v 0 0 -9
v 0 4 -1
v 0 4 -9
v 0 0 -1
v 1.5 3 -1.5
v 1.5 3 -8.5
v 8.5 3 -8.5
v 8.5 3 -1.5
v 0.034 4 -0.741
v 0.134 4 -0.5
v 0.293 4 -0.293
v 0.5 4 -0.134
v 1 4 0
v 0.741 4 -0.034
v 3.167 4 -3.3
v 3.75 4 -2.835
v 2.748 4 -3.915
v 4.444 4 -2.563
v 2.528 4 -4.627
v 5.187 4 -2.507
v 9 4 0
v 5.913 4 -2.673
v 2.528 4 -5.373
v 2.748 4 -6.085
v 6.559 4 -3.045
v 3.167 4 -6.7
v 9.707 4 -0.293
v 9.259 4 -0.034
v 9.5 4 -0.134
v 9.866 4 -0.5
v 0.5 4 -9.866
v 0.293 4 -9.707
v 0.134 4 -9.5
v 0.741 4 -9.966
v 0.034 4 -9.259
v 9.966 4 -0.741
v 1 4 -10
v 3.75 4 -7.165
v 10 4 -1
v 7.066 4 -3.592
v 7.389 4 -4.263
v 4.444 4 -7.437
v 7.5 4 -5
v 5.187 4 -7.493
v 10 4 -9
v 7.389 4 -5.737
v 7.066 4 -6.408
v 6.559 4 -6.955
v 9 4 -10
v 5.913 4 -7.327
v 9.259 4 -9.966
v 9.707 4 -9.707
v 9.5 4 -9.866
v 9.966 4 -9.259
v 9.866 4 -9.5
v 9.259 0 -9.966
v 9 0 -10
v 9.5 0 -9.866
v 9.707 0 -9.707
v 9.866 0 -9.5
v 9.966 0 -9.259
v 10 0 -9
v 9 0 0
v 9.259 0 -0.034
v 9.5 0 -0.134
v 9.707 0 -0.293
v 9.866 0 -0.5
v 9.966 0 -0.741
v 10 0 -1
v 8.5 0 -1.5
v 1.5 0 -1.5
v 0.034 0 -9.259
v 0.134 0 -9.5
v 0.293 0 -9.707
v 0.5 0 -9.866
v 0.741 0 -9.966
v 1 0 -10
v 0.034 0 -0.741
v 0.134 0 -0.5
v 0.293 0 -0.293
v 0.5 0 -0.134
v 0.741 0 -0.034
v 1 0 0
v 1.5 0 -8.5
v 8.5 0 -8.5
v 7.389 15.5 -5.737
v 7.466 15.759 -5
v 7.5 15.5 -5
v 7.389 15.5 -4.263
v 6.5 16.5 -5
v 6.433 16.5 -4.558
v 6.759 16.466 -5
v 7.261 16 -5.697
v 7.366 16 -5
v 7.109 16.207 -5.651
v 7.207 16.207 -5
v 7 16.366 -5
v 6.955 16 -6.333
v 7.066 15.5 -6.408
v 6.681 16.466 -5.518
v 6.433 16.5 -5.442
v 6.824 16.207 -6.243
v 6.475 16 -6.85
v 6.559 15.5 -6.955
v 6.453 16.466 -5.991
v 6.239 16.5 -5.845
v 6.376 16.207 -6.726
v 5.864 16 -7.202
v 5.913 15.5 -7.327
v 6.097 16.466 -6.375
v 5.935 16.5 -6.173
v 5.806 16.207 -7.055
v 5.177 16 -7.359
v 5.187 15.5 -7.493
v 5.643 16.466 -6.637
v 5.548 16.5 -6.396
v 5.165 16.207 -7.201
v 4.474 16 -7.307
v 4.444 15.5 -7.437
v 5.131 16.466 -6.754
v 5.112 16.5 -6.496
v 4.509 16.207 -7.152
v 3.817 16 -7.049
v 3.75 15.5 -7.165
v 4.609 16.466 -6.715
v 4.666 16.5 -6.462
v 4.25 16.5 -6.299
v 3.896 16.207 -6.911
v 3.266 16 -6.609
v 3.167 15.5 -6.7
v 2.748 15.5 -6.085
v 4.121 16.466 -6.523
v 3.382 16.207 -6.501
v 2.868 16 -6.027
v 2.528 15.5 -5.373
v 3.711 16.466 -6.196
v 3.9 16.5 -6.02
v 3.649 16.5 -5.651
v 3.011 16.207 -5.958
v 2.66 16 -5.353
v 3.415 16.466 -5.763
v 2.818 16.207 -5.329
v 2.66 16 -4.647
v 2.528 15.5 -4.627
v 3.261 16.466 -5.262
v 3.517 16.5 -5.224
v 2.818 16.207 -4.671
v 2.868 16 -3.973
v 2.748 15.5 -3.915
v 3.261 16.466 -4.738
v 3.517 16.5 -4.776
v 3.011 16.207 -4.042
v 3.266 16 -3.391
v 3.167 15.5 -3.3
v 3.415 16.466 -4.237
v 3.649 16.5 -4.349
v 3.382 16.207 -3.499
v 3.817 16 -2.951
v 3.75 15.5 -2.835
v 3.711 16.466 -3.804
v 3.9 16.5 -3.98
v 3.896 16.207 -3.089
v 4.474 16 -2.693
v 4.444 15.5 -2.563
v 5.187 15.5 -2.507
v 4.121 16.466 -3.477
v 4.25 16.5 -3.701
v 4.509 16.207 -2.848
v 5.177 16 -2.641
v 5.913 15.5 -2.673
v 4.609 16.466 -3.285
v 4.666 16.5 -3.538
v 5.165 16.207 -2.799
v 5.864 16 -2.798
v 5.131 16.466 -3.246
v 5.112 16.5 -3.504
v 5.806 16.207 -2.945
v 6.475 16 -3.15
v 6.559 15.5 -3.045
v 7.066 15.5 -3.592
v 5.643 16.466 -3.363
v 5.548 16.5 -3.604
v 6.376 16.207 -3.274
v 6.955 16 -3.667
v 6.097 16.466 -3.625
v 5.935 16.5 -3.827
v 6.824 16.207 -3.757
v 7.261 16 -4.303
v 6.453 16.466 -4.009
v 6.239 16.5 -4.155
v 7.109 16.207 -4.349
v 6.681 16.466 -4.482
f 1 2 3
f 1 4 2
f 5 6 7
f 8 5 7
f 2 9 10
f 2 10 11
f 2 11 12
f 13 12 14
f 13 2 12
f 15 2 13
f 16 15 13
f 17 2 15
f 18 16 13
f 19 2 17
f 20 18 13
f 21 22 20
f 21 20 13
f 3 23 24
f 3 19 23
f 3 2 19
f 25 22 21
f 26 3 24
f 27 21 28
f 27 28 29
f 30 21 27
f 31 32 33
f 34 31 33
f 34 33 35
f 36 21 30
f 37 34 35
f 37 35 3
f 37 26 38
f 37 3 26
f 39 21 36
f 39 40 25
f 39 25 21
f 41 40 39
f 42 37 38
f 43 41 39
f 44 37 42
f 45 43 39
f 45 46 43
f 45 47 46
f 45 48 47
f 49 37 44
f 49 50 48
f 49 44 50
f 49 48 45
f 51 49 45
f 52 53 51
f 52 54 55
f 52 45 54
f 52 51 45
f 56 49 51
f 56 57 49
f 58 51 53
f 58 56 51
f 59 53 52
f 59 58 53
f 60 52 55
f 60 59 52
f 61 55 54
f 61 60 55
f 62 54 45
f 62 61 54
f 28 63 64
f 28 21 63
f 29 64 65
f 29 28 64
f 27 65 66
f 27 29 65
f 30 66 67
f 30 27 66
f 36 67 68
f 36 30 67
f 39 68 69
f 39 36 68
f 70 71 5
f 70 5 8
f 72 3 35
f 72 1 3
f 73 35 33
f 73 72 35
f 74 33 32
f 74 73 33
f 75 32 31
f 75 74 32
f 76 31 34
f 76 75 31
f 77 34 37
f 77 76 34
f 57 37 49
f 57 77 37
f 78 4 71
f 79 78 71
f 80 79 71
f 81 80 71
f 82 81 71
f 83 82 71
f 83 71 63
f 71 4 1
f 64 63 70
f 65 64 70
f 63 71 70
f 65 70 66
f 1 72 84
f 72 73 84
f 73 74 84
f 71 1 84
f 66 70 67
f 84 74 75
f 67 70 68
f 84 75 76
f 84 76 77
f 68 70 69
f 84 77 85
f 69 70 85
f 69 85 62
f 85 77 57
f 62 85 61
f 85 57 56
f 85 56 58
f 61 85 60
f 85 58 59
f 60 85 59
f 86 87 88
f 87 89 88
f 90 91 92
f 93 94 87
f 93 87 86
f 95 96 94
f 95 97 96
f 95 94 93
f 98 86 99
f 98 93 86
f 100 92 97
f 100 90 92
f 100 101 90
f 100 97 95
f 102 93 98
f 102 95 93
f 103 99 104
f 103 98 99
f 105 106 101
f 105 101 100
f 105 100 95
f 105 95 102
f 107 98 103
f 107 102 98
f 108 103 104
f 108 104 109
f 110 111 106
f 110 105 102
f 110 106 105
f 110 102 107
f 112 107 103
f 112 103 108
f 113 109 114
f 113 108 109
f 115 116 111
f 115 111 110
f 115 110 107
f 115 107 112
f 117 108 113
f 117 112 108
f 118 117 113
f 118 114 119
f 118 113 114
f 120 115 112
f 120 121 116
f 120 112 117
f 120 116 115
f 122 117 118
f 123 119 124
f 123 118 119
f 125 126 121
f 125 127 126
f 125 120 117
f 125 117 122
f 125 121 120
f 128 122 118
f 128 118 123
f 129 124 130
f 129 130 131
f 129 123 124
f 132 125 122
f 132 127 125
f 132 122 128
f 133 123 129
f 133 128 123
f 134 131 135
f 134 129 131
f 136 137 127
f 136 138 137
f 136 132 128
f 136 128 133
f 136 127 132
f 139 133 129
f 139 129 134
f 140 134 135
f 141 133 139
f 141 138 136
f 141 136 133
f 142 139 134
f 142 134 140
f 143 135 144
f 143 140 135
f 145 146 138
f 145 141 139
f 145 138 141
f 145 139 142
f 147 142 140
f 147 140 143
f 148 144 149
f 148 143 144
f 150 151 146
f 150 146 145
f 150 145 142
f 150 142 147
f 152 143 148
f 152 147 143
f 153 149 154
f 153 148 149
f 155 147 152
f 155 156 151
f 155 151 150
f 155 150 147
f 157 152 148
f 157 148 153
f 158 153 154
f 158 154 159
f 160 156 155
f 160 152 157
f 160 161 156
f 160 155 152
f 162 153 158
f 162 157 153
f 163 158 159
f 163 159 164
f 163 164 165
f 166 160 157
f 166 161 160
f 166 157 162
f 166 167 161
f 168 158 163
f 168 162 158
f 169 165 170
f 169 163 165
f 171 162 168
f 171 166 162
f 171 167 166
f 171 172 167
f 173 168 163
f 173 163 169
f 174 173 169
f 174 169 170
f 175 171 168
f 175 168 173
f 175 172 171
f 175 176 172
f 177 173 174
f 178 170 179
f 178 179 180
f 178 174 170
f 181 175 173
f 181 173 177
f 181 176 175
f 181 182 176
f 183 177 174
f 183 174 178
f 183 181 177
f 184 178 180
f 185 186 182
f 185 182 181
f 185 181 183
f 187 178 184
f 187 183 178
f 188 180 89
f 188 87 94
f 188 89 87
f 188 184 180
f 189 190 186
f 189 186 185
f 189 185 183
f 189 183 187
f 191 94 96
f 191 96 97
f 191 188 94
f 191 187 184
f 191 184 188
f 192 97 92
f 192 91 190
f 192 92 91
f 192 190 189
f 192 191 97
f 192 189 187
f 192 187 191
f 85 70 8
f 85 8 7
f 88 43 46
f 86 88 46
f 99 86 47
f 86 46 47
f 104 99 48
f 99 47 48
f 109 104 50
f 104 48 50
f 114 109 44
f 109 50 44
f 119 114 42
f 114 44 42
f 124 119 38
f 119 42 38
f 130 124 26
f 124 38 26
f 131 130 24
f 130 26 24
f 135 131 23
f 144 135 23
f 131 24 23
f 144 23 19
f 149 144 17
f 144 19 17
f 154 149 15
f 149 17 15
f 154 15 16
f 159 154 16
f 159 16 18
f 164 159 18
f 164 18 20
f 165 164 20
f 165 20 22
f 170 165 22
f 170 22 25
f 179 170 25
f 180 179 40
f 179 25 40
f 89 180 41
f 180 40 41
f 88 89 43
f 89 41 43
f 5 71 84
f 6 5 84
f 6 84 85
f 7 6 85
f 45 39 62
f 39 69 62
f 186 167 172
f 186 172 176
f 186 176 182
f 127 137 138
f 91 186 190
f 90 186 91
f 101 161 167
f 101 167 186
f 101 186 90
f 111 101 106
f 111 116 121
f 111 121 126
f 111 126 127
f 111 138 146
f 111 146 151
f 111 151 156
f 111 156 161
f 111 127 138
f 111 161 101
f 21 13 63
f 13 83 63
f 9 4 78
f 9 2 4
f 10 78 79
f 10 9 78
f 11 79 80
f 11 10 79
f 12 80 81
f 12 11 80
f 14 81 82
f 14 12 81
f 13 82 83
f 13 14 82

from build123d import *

# Parameters (mm, degrees)
SKETCH1_W           = 10
SKETCH1_H           = 10
SKETCH1_W_2         = 7
SKETCH1_H_2         = 7
BOSS_EXTRUDE1_DEPTH = 3
SKETCH2_W           = 10
SKETCH2_H           = 10
BOSS_EXTRUDE2_DEPTH = 1
SKETCH3_R           = 2.5
BOSS_EXTRUDE3_DEPTH = 12.5
FILLET1_R           = 1


with BuildPart() as part:
    # Sketch1 → Boss-Extrude1 (new body)
    with BuildSketch(Plane(origin=(0, 0, 0), x_dir=(1, 0, 0), z_dir=(0, 1, 0))):
        with Locations((5, 5)):
            Rectangle(SKETCH1_W, SKETCH1_H)
        with Locations((5, 5)):
            Rectangle(SKETCH1_W_2, SKETCH1_H_2, mode=Mode.SUBTRACT)
    extrude(amount=BOSS_EXTRUDE1_DEPTH)

    # Sketch2 → Boss-Extrude2 (add)
    with BuildSketch(Plane(origin=(0, 3, 0), x_dir=(1, 0, 0), z_dir=(0, 1, 0))):
        with Locations((5, 5)):
            Rectangle(SKETCH2_W, SKETCH2_H)
    extrude(amount=BOSS_EXTRUDE2_DEPTH)

    # Sketch3 → Boss-Extrude3 (add)
    with BuildSketch(Plane(origin=(0, 4, 0), x_dir=(1, 0, 0), z_dir=(0, 1, 0))):
        with Locations((5, 5)):
            Circle(SKETCH3_R)
    extrude(amount=BOSS_EXTRUDE3_DEPTH)

    # Fillet1
    fillet1_edges = [part.edges().sort_by_distance(p)[0] for p in [
        (2.5, 16.5, -5),
        (0, 2, -10),
        (10, 2, -10),
        (10, 2, 0),
        (0, 2, 0),
    ]]
    fillet(fillet1_edges, radius=FILLET1_R)


solid = part.part
